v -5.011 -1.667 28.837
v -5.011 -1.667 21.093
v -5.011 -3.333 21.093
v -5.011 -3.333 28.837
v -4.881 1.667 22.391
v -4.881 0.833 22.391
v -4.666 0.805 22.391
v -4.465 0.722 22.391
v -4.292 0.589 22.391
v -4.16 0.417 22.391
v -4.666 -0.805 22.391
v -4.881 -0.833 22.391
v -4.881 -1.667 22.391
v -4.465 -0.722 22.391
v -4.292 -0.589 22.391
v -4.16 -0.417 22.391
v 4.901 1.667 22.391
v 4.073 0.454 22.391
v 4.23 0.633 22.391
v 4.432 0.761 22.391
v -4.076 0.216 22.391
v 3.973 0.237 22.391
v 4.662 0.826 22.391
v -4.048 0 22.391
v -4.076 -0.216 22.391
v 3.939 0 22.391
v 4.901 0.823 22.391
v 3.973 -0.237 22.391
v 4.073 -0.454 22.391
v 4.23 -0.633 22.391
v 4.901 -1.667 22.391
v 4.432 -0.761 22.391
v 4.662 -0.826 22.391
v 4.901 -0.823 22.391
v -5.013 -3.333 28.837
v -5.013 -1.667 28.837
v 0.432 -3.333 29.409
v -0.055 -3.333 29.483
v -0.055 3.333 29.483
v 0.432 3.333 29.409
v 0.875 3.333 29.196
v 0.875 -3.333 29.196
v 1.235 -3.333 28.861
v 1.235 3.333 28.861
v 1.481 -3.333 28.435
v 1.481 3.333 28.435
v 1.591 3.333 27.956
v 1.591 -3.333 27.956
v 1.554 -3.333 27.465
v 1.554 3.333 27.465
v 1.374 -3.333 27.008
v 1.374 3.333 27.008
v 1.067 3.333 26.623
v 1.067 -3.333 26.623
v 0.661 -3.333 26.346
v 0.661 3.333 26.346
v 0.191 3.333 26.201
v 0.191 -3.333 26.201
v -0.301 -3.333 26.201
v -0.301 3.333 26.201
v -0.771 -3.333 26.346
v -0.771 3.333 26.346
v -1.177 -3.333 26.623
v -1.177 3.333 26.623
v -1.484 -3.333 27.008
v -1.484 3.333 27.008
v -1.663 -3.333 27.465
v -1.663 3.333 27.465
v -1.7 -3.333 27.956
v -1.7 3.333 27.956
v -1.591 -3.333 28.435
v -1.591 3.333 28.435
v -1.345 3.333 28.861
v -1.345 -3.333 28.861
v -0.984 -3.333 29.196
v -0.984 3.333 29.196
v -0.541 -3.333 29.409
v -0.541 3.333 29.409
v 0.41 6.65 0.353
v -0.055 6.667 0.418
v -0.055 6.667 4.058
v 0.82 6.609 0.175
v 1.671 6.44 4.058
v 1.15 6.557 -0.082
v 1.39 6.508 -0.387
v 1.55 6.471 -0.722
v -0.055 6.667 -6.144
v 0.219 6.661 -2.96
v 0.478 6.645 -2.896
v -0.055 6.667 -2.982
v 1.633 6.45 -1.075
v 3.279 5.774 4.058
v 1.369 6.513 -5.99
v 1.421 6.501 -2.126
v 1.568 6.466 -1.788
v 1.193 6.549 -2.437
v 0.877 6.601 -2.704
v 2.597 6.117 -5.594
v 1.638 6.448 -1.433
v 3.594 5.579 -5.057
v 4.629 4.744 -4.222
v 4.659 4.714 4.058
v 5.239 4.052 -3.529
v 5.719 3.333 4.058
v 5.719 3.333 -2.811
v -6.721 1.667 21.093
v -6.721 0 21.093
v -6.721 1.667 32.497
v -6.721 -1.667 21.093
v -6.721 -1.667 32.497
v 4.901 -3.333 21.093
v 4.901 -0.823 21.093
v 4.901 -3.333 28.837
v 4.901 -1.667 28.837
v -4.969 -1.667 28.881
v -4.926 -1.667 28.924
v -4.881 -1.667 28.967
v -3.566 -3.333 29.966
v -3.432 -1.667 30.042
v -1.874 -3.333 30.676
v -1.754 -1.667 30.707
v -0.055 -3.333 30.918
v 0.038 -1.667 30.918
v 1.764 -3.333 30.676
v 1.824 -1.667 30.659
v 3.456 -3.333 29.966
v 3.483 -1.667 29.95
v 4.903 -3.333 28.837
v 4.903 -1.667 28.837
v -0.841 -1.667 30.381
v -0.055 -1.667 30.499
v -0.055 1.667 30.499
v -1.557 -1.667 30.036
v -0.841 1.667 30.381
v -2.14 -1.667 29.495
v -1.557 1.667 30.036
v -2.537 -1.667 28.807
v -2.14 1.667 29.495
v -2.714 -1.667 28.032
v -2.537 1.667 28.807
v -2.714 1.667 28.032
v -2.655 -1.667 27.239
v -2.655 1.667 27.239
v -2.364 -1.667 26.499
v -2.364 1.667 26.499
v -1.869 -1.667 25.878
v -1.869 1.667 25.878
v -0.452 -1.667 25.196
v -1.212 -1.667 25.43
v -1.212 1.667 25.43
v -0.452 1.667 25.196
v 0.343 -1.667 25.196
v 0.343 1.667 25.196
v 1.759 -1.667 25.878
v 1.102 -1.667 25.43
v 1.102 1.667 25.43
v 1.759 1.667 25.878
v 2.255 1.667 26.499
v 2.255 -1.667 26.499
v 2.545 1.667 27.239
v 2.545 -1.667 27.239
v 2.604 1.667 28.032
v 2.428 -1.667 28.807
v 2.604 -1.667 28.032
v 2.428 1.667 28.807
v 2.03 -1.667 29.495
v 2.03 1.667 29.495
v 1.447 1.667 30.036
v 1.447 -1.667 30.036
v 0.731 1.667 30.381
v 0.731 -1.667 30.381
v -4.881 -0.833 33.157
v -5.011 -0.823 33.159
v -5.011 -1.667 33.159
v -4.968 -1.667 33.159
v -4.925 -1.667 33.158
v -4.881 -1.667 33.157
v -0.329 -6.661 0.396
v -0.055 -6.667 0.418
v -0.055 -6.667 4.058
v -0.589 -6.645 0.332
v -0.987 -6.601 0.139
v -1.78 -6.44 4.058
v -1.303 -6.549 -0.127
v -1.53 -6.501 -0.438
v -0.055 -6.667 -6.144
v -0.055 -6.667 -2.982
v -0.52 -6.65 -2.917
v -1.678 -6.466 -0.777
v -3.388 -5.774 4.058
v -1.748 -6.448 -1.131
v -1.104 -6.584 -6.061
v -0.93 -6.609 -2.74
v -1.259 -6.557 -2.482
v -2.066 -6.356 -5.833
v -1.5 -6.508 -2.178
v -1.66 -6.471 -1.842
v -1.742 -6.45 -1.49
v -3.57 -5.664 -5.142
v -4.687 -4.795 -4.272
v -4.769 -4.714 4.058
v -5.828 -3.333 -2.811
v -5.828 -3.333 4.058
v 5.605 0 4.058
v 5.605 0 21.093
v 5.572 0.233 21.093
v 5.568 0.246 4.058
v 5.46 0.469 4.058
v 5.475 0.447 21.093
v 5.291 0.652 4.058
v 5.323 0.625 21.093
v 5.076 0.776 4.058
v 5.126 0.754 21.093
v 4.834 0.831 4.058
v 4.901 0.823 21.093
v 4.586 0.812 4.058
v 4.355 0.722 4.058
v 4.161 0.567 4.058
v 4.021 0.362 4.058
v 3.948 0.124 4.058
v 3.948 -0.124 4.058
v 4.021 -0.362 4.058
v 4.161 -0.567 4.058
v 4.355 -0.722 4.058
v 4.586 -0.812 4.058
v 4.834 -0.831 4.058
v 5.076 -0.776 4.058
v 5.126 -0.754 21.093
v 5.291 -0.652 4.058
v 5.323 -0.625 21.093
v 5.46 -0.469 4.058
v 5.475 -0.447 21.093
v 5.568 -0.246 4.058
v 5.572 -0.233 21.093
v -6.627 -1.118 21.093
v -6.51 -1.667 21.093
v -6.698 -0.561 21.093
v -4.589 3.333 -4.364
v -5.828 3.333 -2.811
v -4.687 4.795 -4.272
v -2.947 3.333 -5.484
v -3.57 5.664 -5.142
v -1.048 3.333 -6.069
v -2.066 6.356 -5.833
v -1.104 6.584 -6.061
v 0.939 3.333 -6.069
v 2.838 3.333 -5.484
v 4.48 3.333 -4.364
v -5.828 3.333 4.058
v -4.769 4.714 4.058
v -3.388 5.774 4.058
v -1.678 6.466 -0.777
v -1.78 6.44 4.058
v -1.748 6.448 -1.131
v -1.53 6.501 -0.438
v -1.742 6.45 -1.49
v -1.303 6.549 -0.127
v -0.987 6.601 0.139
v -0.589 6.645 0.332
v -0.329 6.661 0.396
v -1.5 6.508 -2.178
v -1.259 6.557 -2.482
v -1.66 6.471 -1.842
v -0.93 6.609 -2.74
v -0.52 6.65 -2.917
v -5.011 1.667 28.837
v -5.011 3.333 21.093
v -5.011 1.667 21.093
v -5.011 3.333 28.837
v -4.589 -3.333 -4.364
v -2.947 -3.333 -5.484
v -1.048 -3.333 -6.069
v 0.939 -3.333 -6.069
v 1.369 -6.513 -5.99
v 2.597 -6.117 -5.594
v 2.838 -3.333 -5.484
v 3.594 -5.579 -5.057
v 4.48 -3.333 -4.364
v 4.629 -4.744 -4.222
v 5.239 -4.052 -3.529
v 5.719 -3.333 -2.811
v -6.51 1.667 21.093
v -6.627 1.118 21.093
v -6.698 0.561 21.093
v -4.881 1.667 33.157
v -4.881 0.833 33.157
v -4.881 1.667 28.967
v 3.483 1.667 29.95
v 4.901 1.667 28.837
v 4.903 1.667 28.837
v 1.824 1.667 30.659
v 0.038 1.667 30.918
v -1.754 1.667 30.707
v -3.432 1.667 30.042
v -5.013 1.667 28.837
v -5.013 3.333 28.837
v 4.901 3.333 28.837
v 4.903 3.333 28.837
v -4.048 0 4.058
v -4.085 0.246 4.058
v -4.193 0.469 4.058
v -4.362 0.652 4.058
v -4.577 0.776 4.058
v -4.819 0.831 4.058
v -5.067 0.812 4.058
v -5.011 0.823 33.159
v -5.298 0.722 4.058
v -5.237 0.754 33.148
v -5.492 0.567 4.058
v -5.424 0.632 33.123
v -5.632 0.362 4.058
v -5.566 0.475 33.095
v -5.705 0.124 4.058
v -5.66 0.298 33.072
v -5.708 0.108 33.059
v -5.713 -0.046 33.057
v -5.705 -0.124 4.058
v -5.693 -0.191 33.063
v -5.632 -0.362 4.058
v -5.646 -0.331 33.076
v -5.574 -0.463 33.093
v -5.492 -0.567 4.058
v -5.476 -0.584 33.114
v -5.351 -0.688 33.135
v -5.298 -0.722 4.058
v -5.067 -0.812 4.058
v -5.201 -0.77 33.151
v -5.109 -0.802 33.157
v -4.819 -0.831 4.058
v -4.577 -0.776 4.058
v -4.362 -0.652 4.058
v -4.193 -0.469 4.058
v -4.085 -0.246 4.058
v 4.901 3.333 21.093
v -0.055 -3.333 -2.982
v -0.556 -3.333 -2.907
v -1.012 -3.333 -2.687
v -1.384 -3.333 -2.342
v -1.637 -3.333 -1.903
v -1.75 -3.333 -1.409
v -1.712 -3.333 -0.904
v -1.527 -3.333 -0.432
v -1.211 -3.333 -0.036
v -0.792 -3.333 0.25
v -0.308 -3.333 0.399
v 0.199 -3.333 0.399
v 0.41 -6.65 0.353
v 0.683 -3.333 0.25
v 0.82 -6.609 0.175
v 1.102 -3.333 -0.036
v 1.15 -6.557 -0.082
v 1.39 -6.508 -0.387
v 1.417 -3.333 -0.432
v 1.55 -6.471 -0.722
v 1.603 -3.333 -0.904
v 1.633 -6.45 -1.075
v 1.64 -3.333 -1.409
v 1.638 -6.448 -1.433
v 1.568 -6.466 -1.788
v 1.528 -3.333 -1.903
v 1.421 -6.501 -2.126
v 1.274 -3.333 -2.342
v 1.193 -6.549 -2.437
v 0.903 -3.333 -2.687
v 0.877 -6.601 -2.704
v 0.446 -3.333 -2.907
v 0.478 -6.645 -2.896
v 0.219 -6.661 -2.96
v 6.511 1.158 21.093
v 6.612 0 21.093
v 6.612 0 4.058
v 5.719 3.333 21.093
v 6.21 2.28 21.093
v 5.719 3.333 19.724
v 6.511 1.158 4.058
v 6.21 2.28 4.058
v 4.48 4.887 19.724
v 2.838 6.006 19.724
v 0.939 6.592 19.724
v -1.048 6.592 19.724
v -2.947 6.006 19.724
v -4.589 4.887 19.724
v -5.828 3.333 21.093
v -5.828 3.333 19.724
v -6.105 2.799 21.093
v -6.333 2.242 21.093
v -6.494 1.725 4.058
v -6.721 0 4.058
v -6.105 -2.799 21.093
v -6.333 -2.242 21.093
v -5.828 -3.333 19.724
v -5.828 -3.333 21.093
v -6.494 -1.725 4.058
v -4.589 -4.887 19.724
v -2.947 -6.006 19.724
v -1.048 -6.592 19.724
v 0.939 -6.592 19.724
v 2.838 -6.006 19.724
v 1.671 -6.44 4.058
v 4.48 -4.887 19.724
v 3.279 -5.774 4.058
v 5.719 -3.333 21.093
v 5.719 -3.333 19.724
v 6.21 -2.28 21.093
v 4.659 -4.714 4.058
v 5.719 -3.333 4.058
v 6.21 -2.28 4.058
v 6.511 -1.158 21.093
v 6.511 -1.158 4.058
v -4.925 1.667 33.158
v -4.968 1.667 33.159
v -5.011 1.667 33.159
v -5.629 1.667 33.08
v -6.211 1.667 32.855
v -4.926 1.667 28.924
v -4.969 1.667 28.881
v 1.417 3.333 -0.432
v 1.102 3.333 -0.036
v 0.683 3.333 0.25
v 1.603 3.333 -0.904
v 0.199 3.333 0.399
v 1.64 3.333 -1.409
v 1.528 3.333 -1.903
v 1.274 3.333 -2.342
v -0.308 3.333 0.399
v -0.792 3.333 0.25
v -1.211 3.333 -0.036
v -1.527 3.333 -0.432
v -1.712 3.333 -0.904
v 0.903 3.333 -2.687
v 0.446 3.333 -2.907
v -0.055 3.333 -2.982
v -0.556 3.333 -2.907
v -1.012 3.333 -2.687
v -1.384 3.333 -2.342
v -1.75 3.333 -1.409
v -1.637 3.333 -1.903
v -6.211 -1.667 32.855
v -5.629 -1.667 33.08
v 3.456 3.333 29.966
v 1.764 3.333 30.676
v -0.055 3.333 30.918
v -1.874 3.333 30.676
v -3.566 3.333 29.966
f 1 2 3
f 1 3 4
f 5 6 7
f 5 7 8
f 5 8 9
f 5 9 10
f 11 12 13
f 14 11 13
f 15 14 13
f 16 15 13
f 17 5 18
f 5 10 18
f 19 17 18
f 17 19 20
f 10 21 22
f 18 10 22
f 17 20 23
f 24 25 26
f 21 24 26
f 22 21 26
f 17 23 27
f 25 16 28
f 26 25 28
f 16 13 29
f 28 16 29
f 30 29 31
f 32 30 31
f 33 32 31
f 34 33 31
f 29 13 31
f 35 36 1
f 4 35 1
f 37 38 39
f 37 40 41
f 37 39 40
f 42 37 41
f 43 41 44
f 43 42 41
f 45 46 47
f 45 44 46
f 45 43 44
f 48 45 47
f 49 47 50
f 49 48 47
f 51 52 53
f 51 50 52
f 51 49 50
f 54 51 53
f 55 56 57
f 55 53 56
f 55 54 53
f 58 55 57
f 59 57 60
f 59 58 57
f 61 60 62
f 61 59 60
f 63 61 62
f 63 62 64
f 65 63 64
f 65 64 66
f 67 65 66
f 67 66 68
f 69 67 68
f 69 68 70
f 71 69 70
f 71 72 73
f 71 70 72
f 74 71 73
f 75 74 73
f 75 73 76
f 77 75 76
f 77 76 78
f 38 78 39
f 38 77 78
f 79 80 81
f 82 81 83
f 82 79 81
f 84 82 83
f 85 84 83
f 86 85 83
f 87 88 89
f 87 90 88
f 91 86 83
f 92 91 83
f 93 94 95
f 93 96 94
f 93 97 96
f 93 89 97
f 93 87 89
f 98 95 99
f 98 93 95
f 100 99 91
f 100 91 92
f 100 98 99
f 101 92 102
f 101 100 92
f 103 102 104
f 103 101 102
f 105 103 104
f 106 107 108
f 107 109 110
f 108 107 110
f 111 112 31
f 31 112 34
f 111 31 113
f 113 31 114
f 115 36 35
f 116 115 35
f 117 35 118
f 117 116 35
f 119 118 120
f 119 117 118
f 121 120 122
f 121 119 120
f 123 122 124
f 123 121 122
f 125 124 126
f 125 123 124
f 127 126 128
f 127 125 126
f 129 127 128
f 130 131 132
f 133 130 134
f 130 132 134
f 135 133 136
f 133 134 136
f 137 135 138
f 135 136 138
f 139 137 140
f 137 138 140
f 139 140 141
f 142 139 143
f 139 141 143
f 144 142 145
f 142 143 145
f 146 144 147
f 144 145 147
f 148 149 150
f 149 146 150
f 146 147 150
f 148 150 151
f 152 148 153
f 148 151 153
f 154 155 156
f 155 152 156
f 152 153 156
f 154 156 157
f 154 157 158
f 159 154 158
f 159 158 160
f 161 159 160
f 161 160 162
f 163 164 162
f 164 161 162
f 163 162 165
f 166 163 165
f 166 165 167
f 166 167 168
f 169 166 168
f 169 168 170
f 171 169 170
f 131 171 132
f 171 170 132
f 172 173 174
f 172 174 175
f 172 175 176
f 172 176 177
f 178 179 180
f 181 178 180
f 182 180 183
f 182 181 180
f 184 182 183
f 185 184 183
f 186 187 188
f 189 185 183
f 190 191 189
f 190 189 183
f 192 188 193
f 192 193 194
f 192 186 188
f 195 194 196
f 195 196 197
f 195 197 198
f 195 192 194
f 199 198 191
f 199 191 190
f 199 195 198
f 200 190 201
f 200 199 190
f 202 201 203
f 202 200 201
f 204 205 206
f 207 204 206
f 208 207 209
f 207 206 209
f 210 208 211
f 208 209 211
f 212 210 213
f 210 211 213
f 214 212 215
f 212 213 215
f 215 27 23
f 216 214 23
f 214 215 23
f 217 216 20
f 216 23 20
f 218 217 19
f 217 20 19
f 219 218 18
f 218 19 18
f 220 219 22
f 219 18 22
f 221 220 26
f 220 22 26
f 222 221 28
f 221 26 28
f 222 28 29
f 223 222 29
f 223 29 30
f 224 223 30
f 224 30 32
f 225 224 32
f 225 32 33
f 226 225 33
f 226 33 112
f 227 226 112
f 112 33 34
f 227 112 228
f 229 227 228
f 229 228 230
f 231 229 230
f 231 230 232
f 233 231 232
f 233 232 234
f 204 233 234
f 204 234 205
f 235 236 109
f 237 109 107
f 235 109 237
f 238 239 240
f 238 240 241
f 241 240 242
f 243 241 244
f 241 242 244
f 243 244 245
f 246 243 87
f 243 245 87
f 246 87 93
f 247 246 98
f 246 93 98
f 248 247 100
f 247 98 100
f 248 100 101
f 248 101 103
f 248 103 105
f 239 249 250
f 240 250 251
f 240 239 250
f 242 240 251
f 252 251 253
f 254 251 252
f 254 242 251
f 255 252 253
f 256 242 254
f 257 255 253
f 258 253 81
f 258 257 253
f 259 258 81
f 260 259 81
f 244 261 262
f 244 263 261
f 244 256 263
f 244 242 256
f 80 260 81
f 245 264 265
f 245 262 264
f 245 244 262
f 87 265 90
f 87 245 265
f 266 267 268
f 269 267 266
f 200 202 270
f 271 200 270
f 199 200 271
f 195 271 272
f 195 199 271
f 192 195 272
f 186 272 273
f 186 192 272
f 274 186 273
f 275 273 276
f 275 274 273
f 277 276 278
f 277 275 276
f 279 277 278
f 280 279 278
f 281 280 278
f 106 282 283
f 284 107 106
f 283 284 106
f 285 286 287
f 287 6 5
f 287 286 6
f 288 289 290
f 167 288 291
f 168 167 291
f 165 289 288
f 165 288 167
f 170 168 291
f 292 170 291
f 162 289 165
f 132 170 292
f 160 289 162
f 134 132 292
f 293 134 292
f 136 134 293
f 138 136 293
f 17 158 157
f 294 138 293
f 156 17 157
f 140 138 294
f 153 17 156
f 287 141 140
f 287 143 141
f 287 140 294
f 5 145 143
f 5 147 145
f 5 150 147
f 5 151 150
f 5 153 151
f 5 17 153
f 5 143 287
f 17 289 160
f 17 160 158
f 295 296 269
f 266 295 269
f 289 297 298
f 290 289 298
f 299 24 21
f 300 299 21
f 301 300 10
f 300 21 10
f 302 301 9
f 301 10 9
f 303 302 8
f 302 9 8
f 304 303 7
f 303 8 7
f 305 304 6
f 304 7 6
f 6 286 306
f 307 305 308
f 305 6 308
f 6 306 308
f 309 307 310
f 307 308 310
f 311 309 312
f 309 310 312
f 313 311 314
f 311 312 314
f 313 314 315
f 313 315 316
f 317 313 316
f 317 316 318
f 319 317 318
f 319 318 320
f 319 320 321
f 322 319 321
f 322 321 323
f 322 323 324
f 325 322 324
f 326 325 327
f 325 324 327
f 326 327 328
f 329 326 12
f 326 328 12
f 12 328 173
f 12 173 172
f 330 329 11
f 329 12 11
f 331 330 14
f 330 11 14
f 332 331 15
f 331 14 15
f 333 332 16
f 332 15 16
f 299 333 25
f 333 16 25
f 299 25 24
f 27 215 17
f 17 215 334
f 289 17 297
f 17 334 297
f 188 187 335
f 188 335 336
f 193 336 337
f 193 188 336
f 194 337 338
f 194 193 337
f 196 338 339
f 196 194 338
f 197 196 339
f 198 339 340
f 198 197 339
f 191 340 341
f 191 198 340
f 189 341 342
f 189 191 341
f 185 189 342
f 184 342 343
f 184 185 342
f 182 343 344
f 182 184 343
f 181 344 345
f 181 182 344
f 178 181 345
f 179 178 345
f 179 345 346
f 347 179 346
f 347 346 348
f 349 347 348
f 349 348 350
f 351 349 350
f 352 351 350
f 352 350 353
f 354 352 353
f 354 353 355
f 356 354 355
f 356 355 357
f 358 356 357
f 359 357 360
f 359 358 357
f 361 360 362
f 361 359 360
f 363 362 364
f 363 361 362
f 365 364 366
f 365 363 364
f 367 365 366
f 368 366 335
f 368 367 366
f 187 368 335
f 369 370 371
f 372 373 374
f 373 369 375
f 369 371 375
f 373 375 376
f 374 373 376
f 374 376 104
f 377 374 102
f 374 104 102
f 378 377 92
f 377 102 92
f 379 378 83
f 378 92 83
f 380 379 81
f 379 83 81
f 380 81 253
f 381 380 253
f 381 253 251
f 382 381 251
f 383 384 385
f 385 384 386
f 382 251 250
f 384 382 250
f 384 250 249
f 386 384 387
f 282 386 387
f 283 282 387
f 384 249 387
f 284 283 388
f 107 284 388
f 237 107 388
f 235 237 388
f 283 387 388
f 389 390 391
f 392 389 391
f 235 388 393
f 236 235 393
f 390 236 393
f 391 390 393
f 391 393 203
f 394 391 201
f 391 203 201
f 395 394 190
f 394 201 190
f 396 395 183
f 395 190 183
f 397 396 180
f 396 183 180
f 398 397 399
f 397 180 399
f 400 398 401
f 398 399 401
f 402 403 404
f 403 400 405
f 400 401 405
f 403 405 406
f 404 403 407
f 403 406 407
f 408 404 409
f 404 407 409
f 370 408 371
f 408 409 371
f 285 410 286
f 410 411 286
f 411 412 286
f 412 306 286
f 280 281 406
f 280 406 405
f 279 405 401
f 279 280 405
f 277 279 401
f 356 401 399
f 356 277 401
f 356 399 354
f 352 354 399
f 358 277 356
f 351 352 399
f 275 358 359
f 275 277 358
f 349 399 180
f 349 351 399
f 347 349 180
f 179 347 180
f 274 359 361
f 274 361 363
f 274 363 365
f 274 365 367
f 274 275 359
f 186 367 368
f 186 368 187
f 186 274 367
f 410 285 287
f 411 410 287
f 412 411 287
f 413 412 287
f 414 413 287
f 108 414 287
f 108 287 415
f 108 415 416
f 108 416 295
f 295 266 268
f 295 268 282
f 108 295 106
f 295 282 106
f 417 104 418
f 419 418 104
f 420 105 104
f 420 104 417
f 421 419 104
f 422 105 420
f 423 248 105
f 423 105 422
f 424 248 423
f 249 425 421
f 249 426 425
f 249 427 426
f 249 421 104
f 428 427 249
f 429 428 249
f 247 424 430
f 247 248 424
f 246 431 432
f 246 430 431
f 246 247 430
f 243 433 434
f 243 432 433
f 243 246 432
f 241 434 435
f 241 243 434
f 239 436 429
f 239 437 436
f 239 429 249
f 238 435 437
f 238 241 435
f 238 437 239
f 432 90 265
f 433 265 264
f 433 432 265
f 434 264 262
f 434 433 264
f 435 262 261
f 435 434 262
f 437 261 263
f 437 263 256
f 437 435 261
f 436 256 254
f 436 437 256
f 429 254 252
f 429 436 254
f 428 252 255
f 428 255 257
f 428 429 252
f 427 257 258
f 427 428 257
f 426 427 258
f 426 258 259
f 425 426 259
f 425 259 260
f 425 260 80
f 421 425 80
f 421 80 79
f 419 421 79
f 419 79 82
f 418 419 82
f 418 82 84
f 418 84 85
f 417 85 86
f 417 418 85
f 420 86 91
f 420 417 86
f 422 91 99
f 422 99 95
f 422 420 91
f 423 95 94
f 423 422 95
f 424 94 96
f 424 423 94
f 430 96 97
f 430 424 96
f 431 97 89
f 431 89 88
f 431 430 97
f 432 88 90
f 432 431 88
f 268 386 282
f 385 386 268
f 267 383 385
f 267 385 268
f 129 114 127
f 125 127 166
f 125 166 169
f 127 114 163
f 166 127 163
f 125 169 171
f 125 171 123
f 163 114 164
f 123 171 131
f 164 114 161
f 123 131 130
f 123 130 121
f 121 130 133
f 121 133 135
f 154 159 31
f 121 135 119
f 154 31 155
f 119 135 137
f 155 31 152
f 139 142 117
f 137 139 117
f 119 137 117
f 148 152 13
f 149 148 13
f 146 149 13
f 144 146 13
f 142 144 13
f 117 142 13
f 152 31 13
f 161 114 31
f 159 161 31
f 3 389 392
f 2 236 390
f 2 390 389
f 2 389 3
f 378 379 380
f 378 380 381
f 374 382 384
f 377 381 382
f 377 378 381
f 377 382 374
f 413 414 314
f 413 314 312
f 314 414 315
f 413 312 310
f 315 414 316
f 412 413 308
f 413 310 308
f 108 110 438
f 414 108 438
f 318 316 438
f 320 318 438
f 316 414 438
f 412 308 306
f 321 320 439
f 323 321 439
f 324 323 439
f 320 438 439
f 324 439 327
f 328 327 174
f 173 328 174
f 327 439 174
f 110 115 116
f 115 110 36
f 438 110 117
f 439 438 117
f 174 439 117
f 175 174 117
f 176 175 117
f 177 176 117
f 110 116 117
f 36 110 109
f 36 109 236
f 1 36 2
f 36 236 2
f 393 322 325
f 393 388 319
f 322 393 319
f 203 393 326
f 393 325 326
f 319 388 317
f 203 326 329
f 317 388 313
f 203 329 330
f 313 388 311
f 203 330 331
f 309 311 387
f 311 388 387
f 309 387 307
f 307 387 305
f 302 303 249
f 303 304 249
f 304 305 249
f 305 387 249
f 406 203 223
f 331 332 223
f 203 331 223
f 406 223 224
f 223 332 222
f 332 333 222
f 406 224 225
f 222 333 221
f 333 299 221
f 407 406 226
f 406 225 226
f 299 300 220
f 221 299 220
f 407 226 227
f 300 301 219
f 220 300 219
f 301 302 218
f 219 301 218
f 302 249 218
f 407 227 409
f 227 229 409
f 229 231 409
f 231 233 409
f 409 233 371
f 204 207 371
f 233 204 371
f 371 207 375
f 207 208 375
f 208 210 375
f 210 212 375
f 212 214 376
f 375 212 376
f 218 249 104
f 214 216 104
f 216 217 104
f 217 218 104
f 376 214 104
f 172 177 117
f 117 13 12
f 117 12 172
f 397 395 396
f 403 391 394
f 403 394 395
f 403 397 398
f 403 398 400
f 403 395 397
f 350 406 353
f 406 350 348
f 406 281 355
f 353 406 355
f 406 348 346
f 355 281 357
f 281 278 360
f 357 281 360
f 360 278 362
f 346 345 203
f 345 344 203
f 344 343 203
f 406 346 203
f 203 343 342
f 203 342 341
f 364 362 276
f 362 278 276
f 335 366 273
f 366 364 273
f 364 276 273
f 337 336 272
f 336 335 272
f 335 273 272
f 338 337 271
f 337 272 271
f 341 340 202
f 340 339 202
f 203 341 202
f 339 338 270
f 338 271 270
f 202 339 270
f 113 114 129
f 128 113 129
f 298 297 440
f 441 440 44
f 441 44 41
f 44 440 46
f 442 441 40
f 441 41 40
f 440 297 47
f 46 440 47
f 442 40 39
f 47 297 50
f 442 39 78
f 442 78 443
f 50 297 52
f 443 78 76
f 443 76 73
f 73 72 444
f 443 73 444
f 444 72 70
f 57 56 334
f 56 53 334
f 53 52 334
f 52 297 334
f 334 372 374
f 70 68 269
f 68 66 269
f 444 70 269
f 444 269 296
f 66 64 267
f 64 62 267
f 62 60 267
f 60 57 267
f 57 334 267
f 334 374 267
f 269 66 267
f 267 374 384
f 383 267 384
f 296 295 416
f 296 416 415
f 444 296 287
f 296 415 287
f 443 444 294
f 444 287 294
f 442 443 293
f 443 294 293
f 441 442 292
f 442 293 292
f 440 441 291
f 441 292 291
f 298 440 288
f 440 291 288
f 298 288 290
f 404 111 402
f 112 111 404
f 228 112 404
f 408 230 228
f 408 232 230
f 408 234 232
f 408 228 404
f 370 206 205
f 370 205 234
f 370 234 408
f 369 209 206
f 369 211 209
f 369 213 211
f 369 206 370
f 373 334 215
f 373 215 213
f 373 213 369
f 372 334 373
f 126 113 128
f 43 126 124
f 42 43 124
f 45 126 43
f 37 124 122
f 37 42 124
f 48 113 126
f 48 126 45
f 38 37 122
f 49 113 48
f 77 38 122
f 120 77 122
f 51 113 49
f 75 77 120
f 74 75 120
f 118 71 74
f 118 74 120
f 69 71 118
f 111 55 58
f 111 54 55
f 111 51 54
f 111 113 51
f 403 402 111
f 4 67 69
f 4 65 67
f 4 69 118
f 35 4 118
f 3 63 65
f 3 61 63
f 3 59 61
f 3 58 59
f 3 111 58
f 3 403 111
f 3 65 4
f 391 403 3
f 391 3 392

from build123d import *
from build123d.topology import SkipClean

# Parameters (mm, degrees)
SKETCH2_R                       = 10
PHALANGE_LENGTH_DEPTH           = 27.5
BOSS_EXTRUDE3_DEPTH             = 5
BOSS_EXTRUDE4_DEPTH             = 5
BOSS_EXTRUDE4_DEPTH_BACK        = 5
CUT_EXTRUDE2_START              = -15.3025
CUT_EXTRUDE2_DEPTH              = 15.3025
SKETCH7_R                       = 1.65
CUT_EXTRUDE3_DEPTH              = 10
CUT_EXTRUDE4_DEPTH              = 2.5
CUT_EXTRUDE4_DEPTH_BACK         = 2.5
CUT_EXTRUDE7_REACH              = 48.49
SKETCH4_R                       = 1.65
CUT_EXTRUDE7_DIRECTION_2_REACH  = 48.49
CUT_EXTRUDE_THIN1_START         = 27.5
CUT_EXTRUDE_THIN1_DEPTH         = 10.361670454
BOSS_EXTRUDE5_REACH             = 47.744
SKETCH9_R                       = 4
SKETCH9_R_2                     = 1.65
CUT_EXTRUDE8_REACH              = 47.078
SKETCH10_R                      = 1.25
CUT_EXTRUDE9_START              = -4
CUT_EXTRUDE9_DEPTH              = 4
CUT_EXTRUDE10_REACH             = 47.744
CUT_EXTRUDE10_DIRECTION_2_REACH = 47.744
CUT_EXTRUDE11_START             = -10
CUT_EXTRUDE11_OUTLINE_W         = 2.565773848
CUT_EXTRUDE11_OUTLINE_H         = 11.6166929
CUT_EXTRUDE11_DEPTH             = 10
BOSS_EXTRUDE7_REACH             = 45.354
CUT_EXTRUDE12_REACH             = 47.078
SKETCH10_2_R                    = 1.25
CUT_EXTRUDE12_DIRECTION_2_REACH = 47.078
SKETCH17_R                      = 1.25
SKETCH17_W                      = 2.42123439
SKETCH17_H                      = 5
CUT_EXTRUDE14_DEPTH             = 16.148519
SCALE1_SCALE                    = 0.666666667
CUT_EXTRUDE15_START             = -10.000004
SKETCH18_R                      = 1.65
CUT_EXTRUDE15_DEPTH             = 13.333342
CUT_EXTRUDE16_START             = -3.333333
SKETCH19_R                      = 1.7
CUT_EXTRUDE16_DEPTH             = 13.333338


# Read off the part's stored shape, not the designer's step: Cut-Extrude-Thin1, Cut-Extrude11
with BuildPart() as part:
    # Sketch2 → Phalange Length (new body)
    with BuildSketch(Plane.XY):
        Circle(SKETCH2_R)
    extrude(amount=PHALANGE_LENGTH_DEPTH)

    # Sketch3 → Boss-Extrude3 (add)
    with BuildSketch(Plane(origin=(0, -10, 0), x_dir=(-1, 0, 0), z_dir=(0, -1, 0))):
        with BuildLine():
            Line((-10, 5.302499701), (-10, 0))
            Line((-10, 0), (10, 0))
            Line((10, 0), (10, 5.302499701))
            ThreePointArc((10, 5.302499701), (0, 15.302499701), (-10, 5.302499701))
        make_face()
    boss_extrude3 = extrude(amount=-BOSS_EXTRUDE3_DEPTH)

    # Mirror1: Boss-Extrude3 across plane
    add(boss_extrude3.mirror(Plane.ZX))

    # Sketch5 → Boss-Extrude4 (add, two sides: drawn at the far end of the back side and taken through both)
    with BuildSketch(Plane(origin=(0, 0, 0), x_dir=(1, 0, 0), z_dir=(0, 1, 0)).offset(-BOSS_EXTRUDE4_DEPTH_BACK)):
        with BuildLine():
            Line((-10, -33.283157911), (-10, -27.5))
            Line((-10, -27.5), (10, -27.5))
            Line((10, -27.5), (10, -33.283157911))
            ThreePointArc((10, -33.283157911), (0, -42.851984156), (-10, -33.283157911))
        make_face()
    extrude(amount=BOSS_EXTRUDE4_DEPTH + BOSS_EXTRUDE4_DEPTH_BACK)

    # Sketch6 → Cut-Extrude2 (cut)
    with SkipClean():  # the faces are left unmerged after this step: merging them gives an invalid solid
        with BuildSketch(Plane.XY.offset(CUT_EXTRUDE2_START)):
            with BuildLine():
                ThreePointArc((0, 10), (5, 8.660254038), (8.660254038, 5))
                Line((8.660254038, 5), (10, 5))
                Line((10, 5), (10, 10))
                Line((10, 10), (0, 10))
            make_face()
            with BuildLine():
                Line((10, -5), (8.660254038, -5))
                ThreePointArc((8.660254038, -5), (5, -8.660254038), (0, -10))
                Line((0, -10), (10, -10))
                Line((10, -10), (10, -5))
            make_face()
            with BuildLine():
                ThreePointArc((-8.660254038, 5), (-5, 8.660254038), (0, 10))
                Line((0, 10), (-10, 10))
                Line((-10, 10), (-10, 5))
                Line((-10, 5), (-8.660254038, 5))
            make_face()
            with BuildLine():
                Line((-10, -10), (0, -10))
                ThreePointArc((0, -10), (-5, -8.660254038), (-8.660254038, -5))
                Line((-8.660254038, -5), (-10, -5))
                Line((-10, -5), (-10, -10))
            make_face()
        extrude(amount=CUT_EXTRUDE2_DEPTH, mode=Mode.SUBTRACT)

    # Sketch7 → Cut-Extrude3 (cut)
    with SkipClean():  # the faces are left unmerged after this step: merging them gives an invalid solid
        with BuildSketch(Plane(origin=(0, 5, 0), x_dir=(1, 0, 0), z_dir=(0, 1, 0))):
            with Locations(Location((0, -35.661984156, 0), (0, 0, 270))):
                Circle(SKETCH7_R)
        extrude(amount=-CUT_EXTRUDE3_DEPTH, mode=Mode.SUBTRACT)

    # Sketch5<2> → Cut-Extrude4 (cut, two sides: drawn at the far end of the back side and taken through both)
    with BuildSketch(Plane(origin=(0, 0, 0), x_dir=(1, 0, 0), z_dir=(0, 1, 0)).offset(-CUT_EXTRUDE4_DEPTH_BACK)):
        with BuildLine():
            Line((-10, -33.283157911), (-10, -27.5))
            Line((-10, -27.5), (10, -27.5))
            Line((10, -27.5), (10, -33.283157911))
            ThreePointArc((10, -33.283157911), (0, -42.851984156), (-10, -33.283157911))
        make_face()
    extrude(amount=CUT_EXTRUDE4_DEPTH + CUT_EXTRUDE4_DEPTH_BACK, mode=Mode.SUBTRACT)

    # Sketch4 → Cut-Extrude7 (cut, up to next)
    with BuildSketch(Plane(origin=(0, -5, 0), x_dir=(1, 0, 0), z_dir=(0, 1, 0)), mode=Mode.PRIVATE) as cut_extrude7_sk1:
        with Locations(Location((0, 8.010159673, 0), (0, 0, 270))):
            Circle(SKETCH4_R)
    cut_extrude7_tool1 = extrude(cut_extrude7_sk1.sketch, amount=-CUT_EXTRUDE7_REACH, mode=Mode.PRIVATE) & part.part
    add(cut_extrude7_tool1.solids().sort_by_distance((0, -5, -8.01016))[0], mode=Mode.SUBTRACT)

    # Sketch4 → Cut-Extrude7 direction 2 (cut, up to next)
    with BuildSketch(Plane(origin=(0, -5, 0), x_dir=(1, 0, 0), z_dir=(0, 1, 0)), mode=Mode.PRIVATE) as cut_extrude7_direction_2_sk1:
        with Locations(Location((0, 8.010159673, 0), (0, 0, 270))):
            Circle(SKETCH4_R)
    cut_extrude7_direction_2_tool1 = extrude(cut_extrude7_direction_2_sk1.sketch, amount=CUT_EXTRUDE7_DIRECTION_2_REACH, mode=Mode.PRIVATE) & part.part
    add(cut_extrude7_direction_2_tool1.solids().sort_by_distance((0, -5, -8.01016))[0], mode=Mode.SUBTRACT)

    # Cut-Extrude-Thin1 outline → Cut-Extrude-Thin1 (cut)
    with SkipClean():  # the faces are left unmerged after this step: merging them gives an invalid solid
        with BuildSketch(Plane.XY.offset(CUT_EXTRUDE_THIN1_START)):
            with BuildLine():
                ThreePointArc((8.660254038, 5), (9.256147934, 3.78466979), (9.682458366, 2.5))
                Line((9.682458366, 2.5), (10, 2.5))
                Line((10, 2.5), (10, 5))
                Line((10, 5), (8.660254038, 5))
            make_face()
            with BuildLine():
                Line((10, -2.5), (9.682458366, -2.5))
                ThreePointArc((9.682458366, -2.5), (9.256147934, -3.78466979), (8.660254038, -5))
                Line((8.660254038, -5), (10, -5))
                Line((10, -5), (10, -2.5))
            make_face()
            with BuildLine():
                Line((-10, 2.5), (-9.682458366, 2.5))
                ThreePointArc((-9.682458366, 2.5), (-9.256147934, 3.78466979), (-8.660254038, 5))
                Line((-8.660254038, 5), (-10, 5))
                Line((-10, 5), (-10, 2.5))
            make_face()
            with BuildLine():
                ThreePointArc((-8.660254038, -5), (-9.256147934, -3.78466979), (-9.682458366, -2.5))
                Line((-9.682458366, -2.5), (-10, -2.5))
                Line((-10, -2.5), (-10, -5))
                Line((-10, -5), (-8.660254038, -5))
            make_face()
        extrude(amount=CUT_EXTRUDE_THIN1_DEPTH, mode=Mode.SUBTRACT)

    # Sketch9 → Boss-Extrude5 (add, up to next)
    with BuildSketch(Plane.XZ.offset(-2.5), mode=Mode.PRIVATE) as boss_extrude5_sk1:
        with Locations(Location((0, 35.661984156, 0), (0, 0, 90))):
            Circle(SKETCH9_R)
        with Locations(Location((0, 35.661984156, 0), (0, 0, 90))):
            Circle(SKETCH9_R_2, mode=Mode.SUBTRACT)
    boss_extrude5_tool1 = extrude(boss_extrude5_sk1.sketch, amount=BOSS_EXTRUDE5_REACH, mode=Mode.PRIVATE) - part.part
    add(boss_extrude5_tool1.solids().sort_by_distance((0, 2.5, 31.775121))[0])

    # Sketch10 → Cut-Extrude8 (cut, up to next)
    with BuildSketch(Plane.XY.offset(27.5), mode=Mode.PRIVATE) as cut_extrude8_sk1:
        with Locations((7.239961745, 0)):
            Circle(SKETCH10_R)
    cut_extrude8_tool1 = extrude(cut_extrude8_sk1.sketch, amount=-CUT_EXTRUDE8_REACH, mode=Mode.PRIVATE) & part.part
    # Sketch10 → Cut-Extrude8 (cut, up to next)
    with BuildSketch(Plane.XY.offset(27.5), mode=Mode.PRIVATE) as cut_extrude8_sk2:
        with Locations((-7.239961745, 0)):
            Circle(SKETCH10_R)
    cut_extrude8_tool2 = extrude(cut_extrude8_sk2.sketch, amount=-CUT_EXTRUDE8_REACH, mode=Mode.PRIVATE) & part.part
    add(cut_extrude8_tool1.solids().sort_by_distance((7.239962, 0, 27.5))[0], mode=Mode.SUBTRACT)
    add(cut_extrude8_tool2.solids().sort_by_distance((-7.239962, 0, 27.5))[0], mode=Mode.SUBTRACT)

    # Sketch11 → Cut-Extrude9 (cut)
    with SkipClean():  # the faces are left unmerged after this step: merging them gives an invalid solid
        with BuildSketch(Plane.XY.offset(27.5).offset(CUT_EXTRUDE9_START)):
            with BuildLine():
                ThreePointArc((8.660254038, 5), (0, 10), (-8.660254038, 5))
                Line((-8.660254038, 5), (8.660254038, 5))
            make_face()
            with BuildLine():
                Line((8.660254038, -5), (-8.660254038, -5))
                ThreePointArc((-8.660254038, -5), (0, -10), (8.660254038, -5))
            make_face()
        extrude(amount=CUT_EXTRUDE9_DEPTH, mode=Mode.SUBTRACT)

    # Sketch12 → Cut-Extrude10 (cut, up to next)
    with BuildSketch(Plane.XZ.offset(-2.5), mode=Mode.PRIVATE) as cut_extrude10_sk1:
        with BuildLine():
            Line((-10.033719202, 42.851984156), (-10.033719202, 35.664892021))
            Line((-10.033719202, 35.664892021), (-8.660254038, 35.664892021))
            ThreePointArc((-8.660254038, 35.664892021), (0, 40.290740593), (8.660254038, 35.664892021))
            Line((8.660254038, 35.664892021), (10.033719202, 35.664892021))
            Line((10.033719202, 35.664892021), (10.033719202, 42.851984156))
            Line((10.033719202, 42.851984156), (-10.033719202, 42.851984156))
        make_face()
    cut_extrude10_tool1 = extrude(cut_extrude10_sk1.sketch, amount=CUT_EXTRUDE10_REACH, mode=Mode.PRIVATE) & part.part
    add(cut_extrude10_tool1.solids().sort_by_distance((0, 2.5, 40.350279))[0], mode=Mode.SUBTRACT)

    # Sketch12 → Cut-Extrude10 direction 2 (cut, up to next)
    with BuildSketch(Plane.XZ.offset(-2.5), mode=Mode.PRIVATE) as cut_extrude10_direction_2_sk1:
        with BuildLine():
            Line((-10.033719202, 42.851984156), (-10.033719202, 35.664892021))
            Line((-10.033719202, 35.664892021), (-8.660254038, 35.664892021))
            ThreePointArc((-8.660254038, 35.664892021), (0, 40.290740593), (8.660254038, 35.664892021))
            Line((8.660254038, 35.664892021), (10.033719202, 35.664892021))
            Line((10.033719202, 35.664892021), (10.033719202, 42.851984156))
            Line((10.033719202, 42.851984156), (-10.033719202, 42.851984156))
        make_face()
    cut_extrude10_direction_2_tool1 = extrude(cut_extrude10_direction_2_sk1.sketch, amount=-CUT_EXTRUDE10_DIRECTION_2_REACH, mode=Mode.PRIVATE) & part.part
    add(cut_extrude10_direction_2_tool1.solids().sort_by_distance((0, 2.5, 40.350279))[0], mode=Mode.SUBTRACT)

    # Cut-Extrude11 outline → Cut-Extrude11 (cut)
    with BuildSketch(Plane.XZ.offset(5).offset(CUT_EXTRUDE11_START)):
        with Locations((-8.717113076, 31.360571369)):
            Rectangle(CUT_EXTRUDE11_OUTLINE_W, CUT_EXTRUDE11_OUTLINE_H)
        with Locations((8.717113076, 31.360571369)):
            Rectangle(CUT_EXTRUDE11_OUTLINE_W, CUT_EXTRUDE11_OUTLINE_H)
    extrude(amount=CUT_EXTRUDE11_DEPTH, mode=Mode.SUBTRACT)

    # Boss-Extrude7: up to this face of the body (flat: up to its plane)
    boss_extrude7_end = Plane(part.part.faces().sort_by_distance((0, 2.5, 27.696174341))[0])
    # Sketch16 → Boss-Extrude7 (add, up to the picked face)
    with BuildSketch(Plane(origin=(0, -2.5, 0), x_dir=(1, 0, 0), z_dir=(0, 1, 0)), mode=Mode.PRIVATE) as boss_extrude7_sk1:
        with BuildLine():
            Line((-4.818727355, -25.552224919), (-7.434226152, -25.552224919))
            Line((-7.434226152, -25.552224919), (-10, -25.552224919))
            Line((-10, -25.552224919), (-10, -42.658561033))
            ThreePointArc((-10, -42.658561033), (-8.808295471, -43.390817912), (-7.43422564, -43.652145139))
            ThreePointArc((-7.43422564, -43.652145139), (-6.033645007, -43.399721533), (-4.818727355, -42.658561033))
            Line((-4.818727355, -42.658561033), (-4.818727355, -39.109527951))
            ThreePointArc((-4.818727355, -39.109527951), (-6.204248493, -38.242230104), (-7.437080645, -37.168917819))
            Line((-7.437080645, -37.168917819), (-7.434226152, -37.168917819))
            Line((-7.434226152, -37.168917819), (-7.434226152, -27.5))
            Line((-7.434226152, -27.5), (-4.818727355, -27.5))
            Line((-4.818727355, -27.5), (-4.818727355, -25.552224919))
        make_face()
    boss_extrude7_tool1 = split(extrude(boss_extrude7_sk1.sketch, amount=BOSS_EXTRUDE7_REACH, mode=Mode.PRIVATE), bisect_by=boss_extrude7_end, keep=Keep.BOTH, mode=Mode.PRIVATE)
    # Sketch16 → Boss-Extrude7 (add, up to the picked face)
    with BuildSketch(Plane(origin=(0, -2.5, 0), x_dir=(1, 0, 0), z_dir=(0, 1, 0)), mode=Mode.PRIVATE) as boss_extrude7_sk2:
        with BuildLine():
            Line((-4.818727355, -39.109527951), (-4.818727355, -27.5))
            Line((-4.818727355, -27.5), (-7.434226152, -27.5))
            Line((-7.434226152, -27.5), (-7.434226152, -37.168917819))
            Line((-7.434226152, -37.168917819), (-7.437080645, -37.168917819))
            ThreePointArc((-7.437080645, -37.168917819), (-6.204248493, -38.242230104), (-4.818727355, -39.109527951))
        make_face()
    boss_extrude7_tool2 = split(extrude(boss_extrude7_sk2.sketch, amount=BOSS_EXTRUDE7_REACH, mode=Mode.PRIVATE), bisect_by=boss_extrude7_end, keep=Keep.BOTH, mode=Mode.PRIVATE)
    add(boss_extrude7_tool1.solids().sort_by(Axis((-7.989429, -2.5, 35.133344), (0, 1, 0)))[0])
    add(boss_extrude7_tool2.solids().sort_by(Axis((-6.08748, -2.5, 32.8879), (0, 1, 0)))[0])

    # Sketch10<2> → Cut-Extrude12 (cut, up to next)
    with BuildSketch(Plane.XY.offset(27.5), mode=Mode.PRIVATE) as cut_extrude12_sk1:
        with Locations((-7.239961745, 0)):
            Circle(SKETCH10_2_R)
    cut_extrude12_tool1 = extrude(cut_extrude12_sk1.sketch, amount=CUT_EXTRUDE12_REACH, mode=Mode.PRIVATE) & part.part
    add(cut_extrude12_tool1.solids().sort_by_distance((-7.239962, 0, 27.5))[0], mode=Mode.SUBTRACT)

    # Sketch10<2> → Cut-Extrude12 direction 2 (cut, up to next)
    with BuildSketch(Plane.XY.offset(27.5), mode=Mode.PRIVATE) as cut_extrude12_direction_2_sk1:
        with Locations((-7.239961745, 0)):
            Circle(SKETCH10_2_R)
    cut_extrude12_direction_2_tool1 = extrude(cut_extrude12_direction_2_sk1.sketch, amount=-CUT_EXTRUDE12_DIRECTION_2_REACH, mode=Mode.PRIVATE) & part.part
    add(cut_extrude12_direction_2_tool1.solids().sort_by_distance((-7.239962, 0, 27.5))[0], mode=Mode.SUBTRACT)

    # Sketch17 → Cut-Extrude14 (cut)
    with SkipClean():  # the faces are left unmerged after this step: merging them gives an invalid solid
        with BuildSketch(Plane.XY.offset(27.5)):
            with Locations((-7.239961745, 0)):
                Circle(SKETCH17_R)
            with Locations((-6.02934455, 0)):
                Rectangle(SKETCH17_W, SKETCH17_H)
        extrude(amount=CUT_EXTRUDE14_DEPTH, mode=Mode.SUBTRACT)


with BuildPart() as part_1:
    # Scale1: scaled about (-0.164338402, -1.53e-07, 12.17341687)
    add(part.part.scale(SCALE1_SCALE).moved(Location((-0.054779467, -5.1e-08, 4.057805623))))

    # Sketch18 → Cut-Extrude15 (cut)
    with BuildSketch(Plane(origin=(0, 3.333328643, 0), x_dir=(1, 0, 0), z_dir=(0, 1, 0)).offset(CUT_EXTRUDE15_START)):
        with Locations(Location((-0.054788063, -27.832629086, 0), (0, 0, 270))):
            Circle(SKETCH18_R)
    extrude(amount=CUT_EXTRUDE15_DEPTH, mode=Mode.SUBTRACT)

    # Sketch19 → Cut-Extrude16 (cut)
    with BuildSketch(Plane(origin=(0, -3.333338023, 0), x_dir=(1, 0, 0), z_dir=(0, 1, 0)).offset(CUT_EXTRUDE16_START)):
        with Locations(Location((-0.054788063, 1.282133466, 0), (0, 0, 90))):
            Circle(SKETCH19_R)
    extrude(amount=CUT_EXTRUDE16_DEPTH, mode=Mode.SUBTRACT)


solid = part_1.part
